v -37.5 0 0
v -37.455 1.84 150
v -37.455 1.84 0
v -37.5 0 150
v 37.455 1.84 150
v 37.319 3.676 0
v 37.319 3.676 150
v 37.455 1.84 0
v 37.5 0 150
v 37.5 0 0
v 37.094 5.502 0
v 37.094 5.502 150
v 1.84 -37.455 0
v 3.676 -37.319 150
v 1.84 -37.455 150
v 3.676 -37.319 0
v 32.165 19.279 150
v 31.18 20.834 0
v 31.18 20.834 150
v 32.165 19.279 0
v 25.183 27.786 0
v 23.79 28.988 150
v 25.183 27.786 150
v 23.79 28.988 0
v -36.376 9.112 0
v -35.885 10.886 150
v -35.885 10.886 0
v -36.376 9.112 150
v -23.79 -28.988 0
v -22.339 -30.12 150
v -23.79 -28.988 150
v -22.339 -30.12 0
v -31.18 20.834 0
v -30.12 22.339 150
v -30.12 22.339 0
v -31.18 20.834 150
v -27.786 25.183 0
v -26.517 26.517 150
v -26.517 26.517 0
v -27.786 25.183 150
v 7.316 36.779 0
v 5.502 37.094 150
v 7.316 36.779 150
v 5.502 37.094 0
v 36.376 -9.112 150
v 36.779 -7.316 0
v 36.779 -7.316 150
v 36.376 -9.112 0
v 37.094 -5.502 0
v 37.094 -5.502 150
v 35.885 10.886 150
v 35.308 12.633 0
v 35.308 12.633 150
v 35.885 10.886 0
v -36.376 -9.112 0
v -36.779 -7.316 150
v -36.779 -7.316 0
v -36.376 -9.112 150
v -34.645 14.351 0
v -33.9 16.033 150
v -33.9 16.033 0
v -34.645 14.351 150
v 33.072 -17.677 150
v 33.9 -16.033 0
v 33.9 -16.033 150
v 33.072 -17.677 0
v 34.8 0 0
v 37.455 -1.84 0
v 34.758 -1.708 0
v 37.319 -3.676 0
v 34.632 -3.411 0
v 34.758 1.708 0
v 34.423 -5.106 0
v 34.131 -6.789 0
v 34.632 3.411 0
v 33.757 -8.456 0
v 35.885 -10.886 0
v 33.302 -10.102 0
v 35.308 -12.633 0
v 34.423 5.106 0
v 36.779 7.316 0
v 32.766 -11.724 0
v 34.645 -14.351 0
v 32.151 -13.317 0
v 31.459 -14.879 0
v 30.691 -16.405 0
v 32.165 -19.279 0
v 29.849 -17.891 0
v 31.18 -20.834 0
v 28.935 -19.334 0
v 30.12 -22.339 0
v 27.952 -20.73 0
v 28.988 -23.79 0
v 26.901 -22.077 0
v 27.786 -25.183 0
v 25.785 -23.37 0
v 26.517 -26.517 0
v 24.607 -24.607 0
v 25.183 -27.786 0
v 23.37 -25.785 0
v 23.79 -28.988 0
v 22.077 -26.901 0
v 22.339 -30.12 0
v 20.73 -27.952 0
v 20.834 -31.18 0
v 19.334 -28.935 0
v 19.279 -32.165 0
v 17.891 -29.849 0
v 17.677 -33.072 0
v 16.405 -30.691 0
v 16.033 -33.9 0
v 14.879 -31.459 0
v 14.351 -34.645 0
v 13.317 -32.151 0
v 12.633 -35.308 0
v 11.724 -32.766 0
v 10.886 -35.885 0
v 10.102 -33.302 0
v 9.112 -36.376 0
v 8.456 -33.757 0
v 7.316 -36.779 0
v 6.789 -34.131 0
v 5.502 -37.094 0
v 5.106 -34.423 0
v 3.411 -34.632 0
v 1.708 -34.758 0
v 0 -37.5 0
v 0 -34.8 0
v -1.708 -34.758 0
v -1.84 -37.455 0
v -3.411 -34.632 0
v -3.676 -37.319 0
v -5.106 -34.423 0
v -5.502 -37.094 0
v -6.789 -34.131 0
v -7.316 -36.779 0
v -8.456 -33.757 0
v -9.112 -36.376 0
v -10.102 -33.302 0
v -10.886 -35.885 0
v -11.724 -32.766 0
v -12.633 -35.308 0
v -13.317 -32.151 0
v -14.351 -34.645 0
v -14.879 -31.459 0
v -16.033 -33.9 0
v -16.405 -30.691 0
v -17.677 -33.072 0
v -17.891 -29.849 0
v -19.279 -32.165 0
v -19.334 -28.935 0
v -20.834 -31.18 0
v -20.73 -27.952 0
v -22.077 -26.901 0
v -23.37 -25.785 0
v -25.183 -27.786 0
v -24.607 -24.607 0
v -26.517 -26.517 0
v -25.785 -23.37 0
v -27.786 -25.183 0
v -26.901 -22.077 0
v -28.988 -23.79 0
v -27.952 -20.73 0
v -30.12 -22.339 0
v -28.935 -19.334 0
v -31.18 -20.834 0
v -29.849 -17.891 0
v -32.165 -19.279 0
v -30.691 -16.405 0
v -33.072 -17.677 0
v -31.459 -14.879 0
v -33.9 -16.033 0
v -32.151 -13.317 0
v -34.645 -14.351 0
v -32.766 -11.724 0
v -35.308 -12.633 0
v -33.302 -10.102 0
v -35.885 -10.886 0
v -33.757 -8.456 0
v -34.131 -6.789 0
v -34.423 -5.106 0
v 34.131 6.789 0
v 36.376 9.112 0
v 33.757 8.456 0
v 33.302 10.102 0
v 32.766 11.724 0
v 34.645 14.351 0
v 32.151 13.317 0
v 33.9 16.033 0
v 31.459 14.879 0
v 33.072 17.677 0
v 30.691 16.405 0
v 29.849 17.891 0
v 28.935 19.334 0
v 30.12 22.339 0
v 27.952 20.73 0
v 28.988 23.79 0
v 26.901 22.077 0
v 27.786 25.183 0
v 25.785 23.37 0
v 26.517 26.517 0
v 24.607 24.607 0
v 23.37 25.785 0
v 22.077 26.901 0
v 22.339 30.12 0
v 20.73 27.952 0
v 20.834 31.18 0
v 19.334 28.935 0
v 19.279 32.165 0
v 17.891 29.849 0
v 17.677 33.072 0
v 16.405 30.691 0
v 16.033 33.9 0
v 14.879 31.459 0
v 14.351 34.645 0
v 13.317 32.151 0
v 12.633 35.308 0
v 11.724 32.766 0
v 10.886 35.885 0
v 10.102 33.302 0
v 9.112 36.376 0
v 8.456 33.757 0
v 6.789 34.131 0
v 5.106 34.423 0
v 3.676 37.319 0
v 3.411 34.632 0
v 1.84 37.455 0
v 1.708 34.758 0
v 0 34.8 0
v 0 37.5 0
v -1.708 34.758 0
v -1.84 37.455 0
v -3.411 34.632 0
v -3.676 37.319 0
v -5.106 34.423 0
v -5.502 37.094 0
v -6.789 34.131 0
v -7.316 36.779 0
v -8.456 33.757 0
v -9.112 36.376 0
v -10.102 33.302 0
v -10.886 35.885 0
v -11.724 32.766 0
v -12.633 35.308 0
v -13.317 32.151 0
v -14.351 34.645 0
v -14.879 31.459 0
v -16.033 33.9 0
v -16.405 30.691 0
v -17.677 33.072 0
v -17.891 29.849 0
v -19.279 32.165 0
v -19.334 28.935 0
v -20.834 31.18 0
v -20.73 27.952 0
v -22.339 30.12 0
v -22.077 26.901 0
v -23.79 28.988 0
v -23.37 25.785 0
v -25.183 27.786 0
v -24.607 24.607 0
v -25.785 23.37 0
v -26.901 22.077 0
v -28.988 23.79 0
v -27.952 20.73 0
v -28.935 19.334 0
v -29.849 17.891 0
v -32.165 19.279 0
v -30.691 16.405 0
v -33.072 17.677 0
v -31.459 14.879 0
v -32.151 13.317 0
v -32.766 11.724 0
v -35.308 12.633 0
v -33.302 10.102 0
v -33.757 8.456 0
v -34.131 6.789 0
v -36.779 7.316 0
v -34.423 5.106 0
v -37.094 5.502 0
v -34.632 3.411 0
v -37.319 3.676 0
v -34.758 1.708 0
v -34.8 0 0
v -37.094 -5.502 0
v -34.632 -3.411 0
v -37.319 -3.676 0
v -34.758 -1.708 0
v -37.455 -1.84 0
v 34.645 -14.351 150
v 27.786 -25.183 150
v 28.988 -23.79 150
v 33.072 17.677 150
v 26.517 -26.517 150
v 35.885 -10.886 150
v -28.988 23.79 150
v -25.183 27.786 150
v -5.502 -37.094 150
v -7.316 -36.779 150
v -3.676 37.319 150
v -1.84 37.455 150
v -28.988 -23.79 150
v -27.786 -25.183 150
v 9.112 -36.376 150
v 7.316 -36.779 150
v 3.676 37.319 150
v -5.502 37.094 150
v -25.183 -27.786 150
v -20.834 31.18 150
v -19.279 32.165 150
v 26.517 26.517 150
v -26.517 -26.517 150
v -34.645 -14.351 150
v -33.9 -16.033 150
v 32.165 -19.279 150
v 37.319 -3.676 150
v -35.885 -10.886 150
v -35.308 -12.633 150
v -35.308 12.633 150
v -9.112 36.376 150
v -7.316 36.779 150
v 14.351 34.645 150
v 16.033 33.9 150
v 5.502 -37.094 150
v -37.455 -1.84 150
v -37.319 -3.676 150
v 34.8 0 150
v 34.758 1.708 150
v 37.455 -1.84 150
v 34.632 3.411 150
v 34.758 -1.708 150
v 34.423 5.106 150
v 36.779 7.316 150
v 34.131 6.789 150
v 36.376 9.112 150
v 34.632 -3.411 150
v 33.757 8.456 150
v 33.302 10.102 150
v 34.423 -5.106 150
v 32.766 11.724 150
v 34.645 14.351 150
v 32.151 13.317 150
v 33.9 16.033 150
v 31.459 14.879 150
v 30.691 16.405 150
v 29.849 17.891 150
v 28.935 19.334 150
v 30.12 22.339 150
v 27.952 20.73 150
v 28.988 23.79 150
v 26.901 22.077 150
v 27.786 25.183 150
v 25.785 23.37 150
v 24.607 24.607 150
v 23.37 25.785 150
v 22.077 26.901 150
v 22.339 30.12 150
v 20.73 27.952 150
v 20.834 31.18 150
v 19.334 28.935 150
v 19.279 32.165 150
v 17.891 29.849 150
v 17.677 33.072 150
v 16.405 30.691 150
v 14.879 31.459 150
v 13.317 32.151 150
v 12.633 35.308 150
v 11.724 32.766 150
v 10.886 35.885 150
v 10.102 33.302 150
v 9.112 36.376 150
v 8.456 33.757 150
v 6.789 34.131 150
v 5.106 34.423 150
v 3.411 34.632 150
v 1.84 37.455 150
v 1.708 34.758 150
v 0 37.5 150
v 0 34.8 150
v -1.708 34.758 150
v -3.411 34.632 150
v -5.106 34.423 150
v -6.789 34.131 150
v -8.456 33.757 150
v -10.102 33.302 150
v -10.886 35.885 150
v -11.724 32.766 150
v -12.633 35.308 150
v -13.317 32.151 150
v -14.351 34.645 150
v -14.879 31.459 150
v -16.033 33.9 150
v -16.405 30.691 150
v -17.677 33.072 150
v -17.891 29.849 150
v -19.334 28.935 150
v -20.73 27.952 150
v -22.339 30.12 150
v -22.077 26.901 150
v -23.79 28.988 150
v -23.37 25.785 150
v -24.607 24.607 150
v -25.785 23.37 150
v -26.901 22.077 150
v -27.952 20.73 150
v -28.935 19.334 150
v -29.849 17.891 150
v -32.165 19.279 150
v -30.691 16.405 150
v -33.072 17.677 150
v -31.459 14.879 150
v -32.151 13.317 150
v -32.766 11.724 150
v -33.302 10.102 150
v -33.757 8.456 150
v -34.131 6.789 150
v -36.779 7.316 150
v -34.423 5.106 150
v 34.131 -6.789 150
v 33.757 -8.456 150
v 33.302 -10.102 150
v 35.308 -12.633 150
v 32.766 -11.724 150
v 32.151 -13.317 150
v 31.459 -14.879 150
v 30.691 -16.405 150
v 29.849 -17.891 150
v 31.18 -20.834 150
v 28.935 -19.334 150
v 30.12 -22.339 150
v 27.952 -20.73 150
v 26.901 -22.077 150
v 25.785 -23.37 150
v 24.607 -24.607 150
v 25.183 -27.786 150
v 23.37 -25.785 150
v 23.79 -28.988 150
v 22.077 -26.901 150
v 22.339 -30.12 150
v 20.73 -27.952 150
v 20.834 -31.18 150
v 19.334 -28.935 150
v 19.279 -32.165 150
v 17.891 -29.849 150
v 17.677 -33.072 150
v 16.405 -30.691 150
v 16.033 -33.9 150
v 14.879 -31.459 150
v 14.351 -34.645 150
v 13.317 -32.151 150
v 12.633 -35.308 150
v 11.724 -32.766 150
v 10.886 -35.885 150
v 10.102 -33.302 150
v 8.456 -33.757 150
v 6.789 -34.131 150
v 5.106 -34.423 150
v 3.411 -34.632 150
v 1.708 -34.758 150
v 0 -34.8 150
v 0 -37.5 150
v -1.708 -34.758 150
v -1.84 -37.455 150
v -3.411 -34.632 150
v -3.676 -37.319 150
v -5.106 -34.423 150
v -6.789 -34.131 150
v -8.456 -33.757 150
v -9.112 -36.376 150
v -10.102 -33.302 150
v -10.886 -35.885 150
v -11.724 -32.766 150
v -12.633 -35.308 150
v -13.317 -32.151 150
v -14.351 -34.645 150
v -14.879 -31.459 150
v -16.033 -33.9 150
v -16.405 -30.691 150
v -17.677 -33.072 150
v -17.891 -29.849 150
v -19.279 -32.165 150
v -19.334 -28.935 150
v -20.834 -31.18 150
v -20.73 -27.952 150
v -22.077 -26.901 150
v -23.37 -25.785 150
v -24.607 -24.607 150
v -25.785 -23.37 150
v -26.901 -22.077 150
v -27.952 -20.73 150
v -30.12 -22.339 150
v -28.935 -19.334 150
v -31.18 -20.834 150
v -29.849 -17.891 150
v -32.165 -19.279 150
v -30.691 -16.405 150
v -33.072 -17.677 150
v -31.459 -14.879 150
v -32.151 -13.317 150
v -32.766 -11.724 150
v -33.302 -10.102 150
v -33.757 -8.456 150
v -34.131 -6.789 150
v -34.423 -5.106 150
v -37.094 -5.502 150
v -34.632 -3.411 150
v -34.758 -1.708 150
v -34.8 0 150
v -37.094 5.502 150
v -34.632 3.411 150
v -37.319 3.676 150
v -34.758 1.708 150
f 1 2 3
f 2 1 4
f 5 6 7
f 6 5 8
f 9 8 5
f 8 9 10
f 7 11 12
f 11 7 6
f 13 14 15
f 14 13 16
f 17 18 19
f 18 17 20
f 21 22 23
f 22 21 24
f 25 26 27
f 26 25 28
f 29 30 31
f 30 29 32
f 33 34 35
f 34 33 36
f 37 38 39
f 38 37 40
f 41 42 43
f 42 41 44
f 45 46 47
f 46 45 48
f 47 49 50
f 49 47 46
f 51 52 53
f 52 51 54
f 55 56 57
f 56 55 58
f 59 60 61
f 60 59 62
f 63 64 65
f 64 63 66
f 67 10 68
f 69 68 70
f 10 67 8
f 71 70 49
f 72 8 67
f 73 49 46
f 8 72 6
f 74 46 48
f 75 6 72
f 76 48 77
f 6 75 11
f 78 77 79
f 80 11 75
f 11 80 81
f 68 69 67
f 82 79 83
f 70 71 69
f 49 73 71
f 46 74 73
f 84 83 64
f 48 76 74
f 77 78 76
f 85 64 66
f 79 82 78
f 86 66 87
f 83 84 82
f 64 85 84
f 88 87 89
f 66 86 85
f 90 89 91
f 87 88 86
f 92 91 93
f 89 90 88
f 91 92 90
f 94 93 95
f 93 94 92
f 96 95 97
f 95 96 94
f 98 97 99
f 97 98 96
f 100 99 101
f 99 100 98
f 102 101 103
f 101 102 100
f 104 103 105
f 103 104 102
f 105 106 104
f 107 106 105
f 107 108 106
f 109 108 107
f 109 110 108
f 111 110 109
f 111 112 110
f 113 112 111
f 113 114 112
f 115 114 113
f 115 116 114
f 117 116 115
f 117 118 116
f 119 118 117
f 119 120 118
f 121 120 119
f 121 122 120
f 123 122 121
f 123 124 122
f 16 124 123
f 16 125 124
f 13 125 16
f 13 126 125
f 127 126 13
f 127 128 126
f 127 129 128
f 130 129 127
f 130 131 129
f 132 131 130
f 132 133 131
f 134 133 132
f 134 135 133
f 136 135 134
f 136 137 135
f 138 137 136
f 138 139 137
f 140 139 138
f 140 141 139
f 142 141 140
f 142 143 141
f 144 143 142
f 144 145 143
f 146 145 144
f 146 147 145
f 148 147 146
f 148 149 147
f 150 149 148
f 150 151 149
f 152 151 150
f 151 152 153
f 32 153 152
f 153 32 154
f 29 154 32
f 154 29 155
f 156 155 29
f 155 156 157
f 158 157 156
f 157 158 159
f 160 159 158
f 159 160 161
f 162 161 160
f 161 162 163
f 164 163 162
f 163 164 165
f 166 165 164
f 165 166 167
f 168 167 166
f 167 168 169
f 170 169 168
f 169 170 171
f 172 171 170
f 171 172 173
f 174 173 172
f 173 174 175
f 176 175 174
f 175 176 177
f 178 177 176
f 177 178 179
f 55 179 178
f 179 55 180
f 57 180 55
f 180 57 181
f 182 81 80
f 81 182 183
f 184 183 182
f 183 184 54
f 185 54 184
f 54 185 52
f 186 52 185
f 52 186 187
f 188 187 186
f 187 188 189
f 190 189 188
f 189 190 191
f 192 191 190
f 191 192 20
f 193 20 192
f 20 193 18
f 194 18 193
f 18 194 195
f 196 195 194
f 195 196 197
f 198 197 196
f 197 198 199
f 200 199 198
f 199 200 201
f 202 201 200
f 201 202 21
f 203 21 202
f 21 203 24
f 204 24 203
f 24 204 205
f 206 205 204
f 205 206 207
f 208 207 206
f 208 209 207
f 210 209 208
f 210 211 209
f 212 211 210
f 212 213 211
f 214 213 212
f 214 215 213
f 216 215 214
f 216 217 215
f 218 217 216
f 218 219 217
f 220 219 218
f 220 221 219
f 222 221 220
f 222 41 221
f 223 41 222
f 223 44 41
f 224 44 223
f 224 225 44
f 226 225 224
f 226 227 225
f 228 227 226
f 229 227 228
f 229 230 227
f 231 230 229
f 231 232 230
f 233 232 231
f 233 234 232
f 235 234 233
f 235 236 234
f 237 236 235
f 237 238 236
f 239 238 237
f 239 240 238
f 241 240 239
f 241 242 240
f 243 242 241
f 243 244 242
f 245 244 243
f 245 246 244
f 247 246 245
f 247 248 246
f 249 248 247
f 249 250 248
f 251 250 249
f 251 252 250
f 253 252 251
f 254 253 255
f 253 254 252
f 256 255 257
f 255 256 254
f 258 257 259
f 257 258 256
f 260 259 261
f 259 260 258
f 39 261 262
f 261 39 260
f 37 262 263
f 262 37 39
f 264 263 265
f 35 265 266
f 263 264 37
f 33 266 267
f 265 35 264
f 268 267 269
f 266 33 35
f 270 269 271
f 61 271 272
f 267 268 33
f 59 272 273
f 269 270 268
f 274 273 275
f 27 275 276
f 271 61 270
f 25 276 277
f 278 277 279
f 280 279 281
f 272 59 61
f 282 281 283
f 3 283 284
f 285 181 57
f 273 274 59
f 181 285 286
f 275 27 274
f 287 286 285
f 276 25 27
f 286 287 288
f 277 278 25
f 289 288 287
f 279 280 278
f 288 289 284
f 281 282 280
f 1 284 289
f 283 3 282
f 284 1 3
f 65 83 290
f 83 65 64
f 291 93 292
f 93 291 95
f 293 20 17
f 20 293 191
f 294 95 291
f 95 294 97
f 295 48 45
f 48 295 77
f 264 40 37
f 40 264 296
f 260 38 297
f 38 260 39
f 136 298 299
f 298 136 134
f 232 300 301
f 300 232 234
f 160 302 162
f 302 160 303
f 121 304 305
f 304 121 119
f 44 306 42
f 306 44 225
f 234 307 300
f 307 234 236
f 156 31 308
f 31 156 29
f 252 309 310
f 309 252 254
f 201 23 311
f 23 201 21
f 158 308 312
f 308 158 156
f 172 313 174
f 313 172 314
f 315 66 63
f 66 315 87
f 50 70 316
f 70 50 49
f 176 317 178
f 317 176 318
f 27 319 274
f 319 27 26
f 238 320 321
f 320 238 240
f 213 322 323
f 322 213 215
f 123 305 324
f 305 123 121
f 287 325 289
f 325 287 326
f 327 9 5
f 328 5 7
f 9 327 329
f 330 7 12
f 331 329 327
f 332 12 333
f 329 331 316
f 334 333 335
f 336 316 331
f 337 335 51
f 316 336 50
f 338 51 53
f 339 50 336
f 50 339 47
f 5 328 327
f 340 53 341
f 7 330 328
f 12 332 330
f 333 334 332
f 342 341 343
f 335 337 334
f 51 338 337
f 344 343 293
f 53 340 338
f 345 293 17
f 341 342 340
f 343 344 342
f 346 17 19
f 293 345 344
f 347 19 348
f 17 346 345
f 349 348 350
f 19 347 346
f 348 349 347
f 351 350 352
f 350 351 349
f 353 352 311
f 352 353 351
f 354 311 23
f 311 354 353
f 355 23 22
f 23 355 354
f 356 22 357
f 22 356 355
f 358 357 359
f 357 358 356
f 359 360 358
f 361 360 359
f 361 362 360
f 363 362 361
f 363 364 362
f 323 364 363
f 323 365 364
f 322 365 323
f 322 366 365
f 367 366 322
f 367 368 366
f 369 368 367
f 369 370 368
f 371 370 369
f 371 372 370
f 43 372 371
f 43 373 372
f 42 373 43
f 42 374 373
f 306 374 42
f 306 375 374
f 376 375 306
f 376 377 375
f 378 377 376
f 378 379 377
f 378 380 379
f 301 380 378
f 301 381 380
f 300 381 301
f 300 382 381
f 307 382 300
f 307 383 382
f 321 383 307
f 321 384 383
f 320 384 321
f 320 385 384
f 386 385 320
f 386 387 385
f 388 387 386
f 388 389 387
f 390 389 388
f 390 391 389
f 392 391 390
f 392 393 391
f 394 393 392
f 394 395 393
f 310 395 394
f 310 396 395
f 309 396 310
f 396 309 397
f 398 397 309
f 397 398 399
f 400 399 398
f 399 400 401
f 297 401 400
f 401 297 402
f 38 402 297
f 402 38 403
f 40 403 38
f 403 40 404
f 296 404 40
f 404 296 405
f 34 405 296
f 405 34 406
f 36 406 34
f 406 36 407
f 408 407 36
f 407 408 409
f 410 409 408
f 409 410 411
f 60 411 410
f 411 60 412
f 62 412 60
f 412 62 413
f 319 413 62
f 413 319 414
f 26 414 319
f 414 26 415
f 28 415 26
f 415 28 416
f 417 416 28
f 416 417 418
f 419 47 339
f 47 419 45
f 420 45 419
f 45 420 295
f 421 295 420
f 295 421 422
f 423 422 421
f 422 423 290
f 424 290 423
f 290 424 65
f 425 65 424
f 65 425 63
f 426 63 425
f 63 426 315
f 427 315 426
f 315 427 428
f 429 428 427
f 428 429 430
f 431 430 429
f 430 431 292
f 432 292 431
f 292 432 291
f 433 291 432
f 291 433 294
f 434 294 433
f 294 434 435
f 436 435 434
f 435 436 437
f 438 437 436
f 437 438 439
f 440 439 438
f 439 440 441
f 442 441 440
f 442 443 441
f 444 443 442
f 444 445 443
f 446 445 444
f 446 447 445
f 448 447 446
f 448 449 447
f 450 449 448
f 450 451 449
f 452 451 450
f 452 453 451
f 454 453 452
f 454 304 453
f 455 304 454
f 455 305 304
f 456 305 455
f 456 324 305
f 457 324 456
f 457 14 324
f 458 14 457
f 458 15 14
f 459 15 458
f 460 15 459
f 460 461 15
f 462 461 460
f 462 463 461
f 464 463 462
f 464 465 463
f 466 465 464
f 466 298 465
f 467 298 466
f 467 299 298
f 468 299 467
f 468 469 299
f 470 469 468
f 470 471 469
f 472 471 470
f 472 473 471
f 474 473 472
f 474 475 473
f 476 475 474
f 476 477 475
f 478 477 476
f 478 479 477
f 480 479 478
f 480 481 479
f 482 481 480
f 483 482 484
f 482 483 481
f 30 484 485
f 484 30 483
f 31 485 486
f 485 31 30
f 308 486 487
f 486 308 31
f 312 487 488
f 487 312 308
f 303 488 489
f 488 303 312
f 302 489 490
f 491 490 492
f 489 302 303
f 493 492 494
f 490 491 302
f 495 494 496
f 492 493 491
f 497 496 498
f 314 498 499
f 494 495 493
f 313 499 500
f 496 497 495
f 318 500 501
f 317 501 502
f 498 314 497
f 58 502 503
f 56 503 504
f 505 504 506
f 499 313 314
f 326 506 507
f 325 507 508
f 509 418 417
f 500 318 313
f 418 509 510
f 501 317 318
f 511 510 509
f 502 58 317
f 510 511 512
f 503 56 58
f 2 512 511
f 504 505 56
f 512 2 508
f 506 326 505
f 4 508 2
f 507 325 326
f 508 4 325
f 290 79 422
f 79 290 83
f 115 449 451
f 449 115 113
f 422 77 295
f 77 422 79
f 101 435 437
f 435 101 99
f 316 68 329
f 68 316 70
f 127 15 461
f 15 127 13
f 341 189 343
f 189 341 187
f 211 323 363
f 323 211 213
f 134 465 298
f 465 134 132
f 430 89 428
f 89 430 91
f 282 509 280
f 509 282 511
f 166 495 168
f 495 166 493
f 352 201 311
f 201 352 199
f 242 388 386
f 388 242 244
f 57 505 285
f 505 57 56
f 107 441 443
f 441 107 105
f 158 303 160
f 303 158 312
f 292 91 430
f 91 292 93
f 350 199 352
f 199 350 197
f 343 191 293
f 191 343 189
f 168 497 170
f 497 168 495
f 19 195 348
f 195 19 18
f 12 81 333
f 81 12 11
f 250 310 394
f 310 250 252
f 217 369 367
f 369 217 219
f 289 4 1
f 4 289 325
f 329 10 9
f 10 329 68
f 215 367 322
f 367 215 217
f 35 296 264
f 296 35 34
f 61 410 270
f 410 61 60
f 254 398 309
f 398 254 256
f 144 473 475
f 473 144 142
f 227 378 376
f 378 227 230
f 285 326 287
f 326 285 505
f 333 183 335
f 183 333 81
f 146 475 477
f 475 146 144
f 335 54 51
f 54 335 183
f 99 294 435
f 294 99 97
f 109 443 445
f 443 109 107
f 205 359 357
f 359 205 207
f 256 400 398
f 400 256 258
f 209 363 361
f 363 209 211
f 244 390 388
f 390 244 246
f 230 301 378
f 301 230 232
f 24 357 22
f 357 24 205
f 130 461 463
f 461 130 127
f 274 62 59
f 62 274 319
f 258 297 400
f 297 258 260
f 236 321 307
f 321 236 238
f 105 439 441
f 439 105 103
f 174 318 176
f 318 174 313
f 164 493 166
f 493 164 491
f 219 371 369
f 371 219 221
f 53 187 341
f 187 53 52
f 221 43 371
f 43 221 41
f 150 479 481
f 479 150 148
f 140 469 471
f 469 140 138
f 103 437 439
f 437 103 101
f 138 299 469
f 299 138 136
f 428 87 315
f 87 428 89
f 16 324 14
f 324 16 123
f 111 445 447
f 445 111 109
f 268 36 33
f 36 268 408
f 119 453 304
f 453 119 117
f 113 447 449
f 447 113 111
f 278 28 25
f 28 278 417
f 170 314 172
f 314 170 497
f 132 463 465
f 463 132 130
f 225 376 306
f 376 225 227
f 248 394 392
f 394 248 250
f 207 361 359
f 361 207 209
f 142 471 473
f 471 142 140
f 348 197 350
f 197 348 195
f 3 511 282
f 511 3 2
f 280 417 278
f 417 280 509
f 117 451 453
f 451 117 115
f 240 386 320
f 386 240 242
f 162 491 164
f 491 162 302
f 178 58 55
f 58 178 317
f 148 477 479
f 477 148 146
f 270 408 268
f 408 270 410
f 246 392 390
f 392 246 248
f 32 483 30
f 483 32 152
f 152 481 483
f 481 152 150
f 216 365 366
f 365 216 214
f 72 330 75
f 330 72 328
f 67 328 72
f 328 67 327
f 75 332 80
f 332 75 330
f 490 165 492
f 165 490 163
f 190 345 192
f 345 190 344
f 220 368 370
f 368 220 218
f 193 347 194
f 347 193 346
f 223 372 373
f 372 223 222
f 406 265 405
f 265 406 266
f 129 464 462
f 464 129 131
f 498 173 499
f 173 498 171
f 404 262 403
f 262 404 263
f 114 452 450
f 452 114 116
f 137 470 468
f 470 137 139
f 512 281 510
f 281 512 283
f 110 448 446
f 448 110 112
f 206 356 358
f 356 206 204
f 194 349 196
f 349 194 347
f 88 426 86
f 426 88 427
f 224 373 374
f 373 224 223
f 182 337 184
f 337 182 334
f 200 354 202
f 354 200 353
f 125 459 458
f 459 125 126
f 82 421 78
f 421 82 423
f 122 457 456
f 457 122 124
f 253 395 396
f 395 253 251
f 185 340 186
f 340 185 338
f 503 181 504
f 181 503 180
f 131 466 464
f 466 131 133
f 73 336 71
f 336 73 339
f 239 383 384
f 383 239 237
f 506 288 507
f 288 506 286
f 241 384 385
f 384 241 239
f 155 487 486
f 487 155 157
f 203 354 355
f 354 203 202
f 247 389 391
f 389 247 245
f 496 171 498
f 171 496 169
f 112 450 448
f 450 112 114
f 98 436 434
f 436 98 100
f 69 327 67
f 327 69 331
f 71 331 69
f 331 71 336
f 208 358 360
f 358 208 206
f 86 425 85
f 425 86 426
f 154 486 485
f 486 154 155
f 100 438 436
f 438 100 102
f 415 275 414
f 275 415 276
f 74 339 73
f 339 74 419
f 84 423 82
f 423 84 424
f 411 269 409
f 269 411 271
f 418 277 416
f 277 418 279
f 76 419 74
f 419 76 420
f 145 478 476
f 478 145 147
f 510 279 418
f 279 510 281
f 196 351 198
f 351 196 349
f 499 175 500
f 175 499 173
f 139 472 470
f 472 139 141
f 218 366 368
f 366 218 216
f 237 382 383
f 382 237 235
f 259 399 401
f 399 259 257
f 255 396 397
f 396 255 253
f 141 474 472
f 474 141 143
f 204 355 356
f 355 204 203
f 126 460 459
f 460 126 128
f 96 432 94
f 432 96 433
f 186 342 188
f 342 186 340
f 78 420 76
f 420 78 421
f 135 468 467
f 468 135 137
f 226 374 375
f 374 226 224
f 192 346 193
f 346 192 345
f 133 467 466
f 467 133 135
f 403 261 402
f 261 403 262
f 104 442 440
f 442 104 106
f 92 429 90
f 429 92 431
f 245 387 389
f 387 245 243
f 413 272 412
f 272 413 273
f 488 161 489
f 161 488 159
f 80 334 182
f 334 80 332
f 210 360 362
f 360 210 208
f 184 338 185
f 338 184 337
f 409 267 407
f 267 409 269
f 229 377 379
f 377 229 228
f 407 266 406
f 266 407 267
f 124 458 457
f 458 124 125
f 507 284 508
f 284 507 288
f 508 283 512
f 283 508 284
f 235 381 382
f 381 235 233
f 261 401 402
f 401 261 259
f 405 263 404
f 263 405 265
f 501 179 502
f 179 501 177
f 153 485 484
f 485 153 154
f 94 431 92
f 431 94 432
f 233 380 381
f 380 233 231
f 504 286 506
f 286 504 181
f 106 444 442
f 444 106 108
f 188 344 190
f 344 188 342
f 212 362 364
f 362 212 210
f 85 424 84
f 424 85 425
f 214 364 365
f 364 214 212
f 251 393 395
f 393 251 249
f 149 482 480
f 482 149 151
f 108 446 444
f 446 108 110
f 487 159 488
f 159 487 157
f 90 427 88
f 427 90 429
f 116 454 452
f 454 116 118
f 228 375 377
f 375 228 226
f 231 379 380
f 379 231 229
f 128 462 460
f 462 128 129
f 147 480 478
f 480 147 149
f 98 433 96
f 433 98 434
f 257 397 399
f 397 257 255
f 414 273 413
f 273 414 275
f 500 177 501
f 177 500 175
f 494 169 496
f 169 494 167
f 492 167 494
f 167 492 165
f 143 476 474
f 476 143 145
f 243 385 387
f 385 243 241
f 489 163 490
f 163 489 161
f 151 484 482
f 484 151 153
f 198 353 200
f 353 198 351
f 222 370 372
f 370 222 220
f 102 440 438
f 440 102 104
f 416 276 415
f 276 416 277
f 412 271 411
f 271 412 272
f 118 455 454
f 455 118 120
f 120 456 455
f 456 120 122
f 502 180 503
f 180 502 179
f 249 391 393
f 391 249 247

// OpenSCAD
$fn = 128;

// HT 75 pipe, length 150 mm (approximate standard dimensions)
// Nominal DN 75: OD ~ 75 mm, wall ~ 2.7 mm (typical), so ID ~ 69.6 mm
// Simple straight pipe segment (no socket/bell)

pipe_length = 150;
outer_d = 75;
wall = 2.7;
inner_d = outer_d - 2*wall;

module ht_pipe(od=75, id=69.6, L=150) {
    difference() {
        cylinder(h=L, d=od);
        translate([0,0,-0.5])
            cylinder(h=L+1, d=id);
    }
}

ht_pipe(outer_d, inner_d, pipe_length);
